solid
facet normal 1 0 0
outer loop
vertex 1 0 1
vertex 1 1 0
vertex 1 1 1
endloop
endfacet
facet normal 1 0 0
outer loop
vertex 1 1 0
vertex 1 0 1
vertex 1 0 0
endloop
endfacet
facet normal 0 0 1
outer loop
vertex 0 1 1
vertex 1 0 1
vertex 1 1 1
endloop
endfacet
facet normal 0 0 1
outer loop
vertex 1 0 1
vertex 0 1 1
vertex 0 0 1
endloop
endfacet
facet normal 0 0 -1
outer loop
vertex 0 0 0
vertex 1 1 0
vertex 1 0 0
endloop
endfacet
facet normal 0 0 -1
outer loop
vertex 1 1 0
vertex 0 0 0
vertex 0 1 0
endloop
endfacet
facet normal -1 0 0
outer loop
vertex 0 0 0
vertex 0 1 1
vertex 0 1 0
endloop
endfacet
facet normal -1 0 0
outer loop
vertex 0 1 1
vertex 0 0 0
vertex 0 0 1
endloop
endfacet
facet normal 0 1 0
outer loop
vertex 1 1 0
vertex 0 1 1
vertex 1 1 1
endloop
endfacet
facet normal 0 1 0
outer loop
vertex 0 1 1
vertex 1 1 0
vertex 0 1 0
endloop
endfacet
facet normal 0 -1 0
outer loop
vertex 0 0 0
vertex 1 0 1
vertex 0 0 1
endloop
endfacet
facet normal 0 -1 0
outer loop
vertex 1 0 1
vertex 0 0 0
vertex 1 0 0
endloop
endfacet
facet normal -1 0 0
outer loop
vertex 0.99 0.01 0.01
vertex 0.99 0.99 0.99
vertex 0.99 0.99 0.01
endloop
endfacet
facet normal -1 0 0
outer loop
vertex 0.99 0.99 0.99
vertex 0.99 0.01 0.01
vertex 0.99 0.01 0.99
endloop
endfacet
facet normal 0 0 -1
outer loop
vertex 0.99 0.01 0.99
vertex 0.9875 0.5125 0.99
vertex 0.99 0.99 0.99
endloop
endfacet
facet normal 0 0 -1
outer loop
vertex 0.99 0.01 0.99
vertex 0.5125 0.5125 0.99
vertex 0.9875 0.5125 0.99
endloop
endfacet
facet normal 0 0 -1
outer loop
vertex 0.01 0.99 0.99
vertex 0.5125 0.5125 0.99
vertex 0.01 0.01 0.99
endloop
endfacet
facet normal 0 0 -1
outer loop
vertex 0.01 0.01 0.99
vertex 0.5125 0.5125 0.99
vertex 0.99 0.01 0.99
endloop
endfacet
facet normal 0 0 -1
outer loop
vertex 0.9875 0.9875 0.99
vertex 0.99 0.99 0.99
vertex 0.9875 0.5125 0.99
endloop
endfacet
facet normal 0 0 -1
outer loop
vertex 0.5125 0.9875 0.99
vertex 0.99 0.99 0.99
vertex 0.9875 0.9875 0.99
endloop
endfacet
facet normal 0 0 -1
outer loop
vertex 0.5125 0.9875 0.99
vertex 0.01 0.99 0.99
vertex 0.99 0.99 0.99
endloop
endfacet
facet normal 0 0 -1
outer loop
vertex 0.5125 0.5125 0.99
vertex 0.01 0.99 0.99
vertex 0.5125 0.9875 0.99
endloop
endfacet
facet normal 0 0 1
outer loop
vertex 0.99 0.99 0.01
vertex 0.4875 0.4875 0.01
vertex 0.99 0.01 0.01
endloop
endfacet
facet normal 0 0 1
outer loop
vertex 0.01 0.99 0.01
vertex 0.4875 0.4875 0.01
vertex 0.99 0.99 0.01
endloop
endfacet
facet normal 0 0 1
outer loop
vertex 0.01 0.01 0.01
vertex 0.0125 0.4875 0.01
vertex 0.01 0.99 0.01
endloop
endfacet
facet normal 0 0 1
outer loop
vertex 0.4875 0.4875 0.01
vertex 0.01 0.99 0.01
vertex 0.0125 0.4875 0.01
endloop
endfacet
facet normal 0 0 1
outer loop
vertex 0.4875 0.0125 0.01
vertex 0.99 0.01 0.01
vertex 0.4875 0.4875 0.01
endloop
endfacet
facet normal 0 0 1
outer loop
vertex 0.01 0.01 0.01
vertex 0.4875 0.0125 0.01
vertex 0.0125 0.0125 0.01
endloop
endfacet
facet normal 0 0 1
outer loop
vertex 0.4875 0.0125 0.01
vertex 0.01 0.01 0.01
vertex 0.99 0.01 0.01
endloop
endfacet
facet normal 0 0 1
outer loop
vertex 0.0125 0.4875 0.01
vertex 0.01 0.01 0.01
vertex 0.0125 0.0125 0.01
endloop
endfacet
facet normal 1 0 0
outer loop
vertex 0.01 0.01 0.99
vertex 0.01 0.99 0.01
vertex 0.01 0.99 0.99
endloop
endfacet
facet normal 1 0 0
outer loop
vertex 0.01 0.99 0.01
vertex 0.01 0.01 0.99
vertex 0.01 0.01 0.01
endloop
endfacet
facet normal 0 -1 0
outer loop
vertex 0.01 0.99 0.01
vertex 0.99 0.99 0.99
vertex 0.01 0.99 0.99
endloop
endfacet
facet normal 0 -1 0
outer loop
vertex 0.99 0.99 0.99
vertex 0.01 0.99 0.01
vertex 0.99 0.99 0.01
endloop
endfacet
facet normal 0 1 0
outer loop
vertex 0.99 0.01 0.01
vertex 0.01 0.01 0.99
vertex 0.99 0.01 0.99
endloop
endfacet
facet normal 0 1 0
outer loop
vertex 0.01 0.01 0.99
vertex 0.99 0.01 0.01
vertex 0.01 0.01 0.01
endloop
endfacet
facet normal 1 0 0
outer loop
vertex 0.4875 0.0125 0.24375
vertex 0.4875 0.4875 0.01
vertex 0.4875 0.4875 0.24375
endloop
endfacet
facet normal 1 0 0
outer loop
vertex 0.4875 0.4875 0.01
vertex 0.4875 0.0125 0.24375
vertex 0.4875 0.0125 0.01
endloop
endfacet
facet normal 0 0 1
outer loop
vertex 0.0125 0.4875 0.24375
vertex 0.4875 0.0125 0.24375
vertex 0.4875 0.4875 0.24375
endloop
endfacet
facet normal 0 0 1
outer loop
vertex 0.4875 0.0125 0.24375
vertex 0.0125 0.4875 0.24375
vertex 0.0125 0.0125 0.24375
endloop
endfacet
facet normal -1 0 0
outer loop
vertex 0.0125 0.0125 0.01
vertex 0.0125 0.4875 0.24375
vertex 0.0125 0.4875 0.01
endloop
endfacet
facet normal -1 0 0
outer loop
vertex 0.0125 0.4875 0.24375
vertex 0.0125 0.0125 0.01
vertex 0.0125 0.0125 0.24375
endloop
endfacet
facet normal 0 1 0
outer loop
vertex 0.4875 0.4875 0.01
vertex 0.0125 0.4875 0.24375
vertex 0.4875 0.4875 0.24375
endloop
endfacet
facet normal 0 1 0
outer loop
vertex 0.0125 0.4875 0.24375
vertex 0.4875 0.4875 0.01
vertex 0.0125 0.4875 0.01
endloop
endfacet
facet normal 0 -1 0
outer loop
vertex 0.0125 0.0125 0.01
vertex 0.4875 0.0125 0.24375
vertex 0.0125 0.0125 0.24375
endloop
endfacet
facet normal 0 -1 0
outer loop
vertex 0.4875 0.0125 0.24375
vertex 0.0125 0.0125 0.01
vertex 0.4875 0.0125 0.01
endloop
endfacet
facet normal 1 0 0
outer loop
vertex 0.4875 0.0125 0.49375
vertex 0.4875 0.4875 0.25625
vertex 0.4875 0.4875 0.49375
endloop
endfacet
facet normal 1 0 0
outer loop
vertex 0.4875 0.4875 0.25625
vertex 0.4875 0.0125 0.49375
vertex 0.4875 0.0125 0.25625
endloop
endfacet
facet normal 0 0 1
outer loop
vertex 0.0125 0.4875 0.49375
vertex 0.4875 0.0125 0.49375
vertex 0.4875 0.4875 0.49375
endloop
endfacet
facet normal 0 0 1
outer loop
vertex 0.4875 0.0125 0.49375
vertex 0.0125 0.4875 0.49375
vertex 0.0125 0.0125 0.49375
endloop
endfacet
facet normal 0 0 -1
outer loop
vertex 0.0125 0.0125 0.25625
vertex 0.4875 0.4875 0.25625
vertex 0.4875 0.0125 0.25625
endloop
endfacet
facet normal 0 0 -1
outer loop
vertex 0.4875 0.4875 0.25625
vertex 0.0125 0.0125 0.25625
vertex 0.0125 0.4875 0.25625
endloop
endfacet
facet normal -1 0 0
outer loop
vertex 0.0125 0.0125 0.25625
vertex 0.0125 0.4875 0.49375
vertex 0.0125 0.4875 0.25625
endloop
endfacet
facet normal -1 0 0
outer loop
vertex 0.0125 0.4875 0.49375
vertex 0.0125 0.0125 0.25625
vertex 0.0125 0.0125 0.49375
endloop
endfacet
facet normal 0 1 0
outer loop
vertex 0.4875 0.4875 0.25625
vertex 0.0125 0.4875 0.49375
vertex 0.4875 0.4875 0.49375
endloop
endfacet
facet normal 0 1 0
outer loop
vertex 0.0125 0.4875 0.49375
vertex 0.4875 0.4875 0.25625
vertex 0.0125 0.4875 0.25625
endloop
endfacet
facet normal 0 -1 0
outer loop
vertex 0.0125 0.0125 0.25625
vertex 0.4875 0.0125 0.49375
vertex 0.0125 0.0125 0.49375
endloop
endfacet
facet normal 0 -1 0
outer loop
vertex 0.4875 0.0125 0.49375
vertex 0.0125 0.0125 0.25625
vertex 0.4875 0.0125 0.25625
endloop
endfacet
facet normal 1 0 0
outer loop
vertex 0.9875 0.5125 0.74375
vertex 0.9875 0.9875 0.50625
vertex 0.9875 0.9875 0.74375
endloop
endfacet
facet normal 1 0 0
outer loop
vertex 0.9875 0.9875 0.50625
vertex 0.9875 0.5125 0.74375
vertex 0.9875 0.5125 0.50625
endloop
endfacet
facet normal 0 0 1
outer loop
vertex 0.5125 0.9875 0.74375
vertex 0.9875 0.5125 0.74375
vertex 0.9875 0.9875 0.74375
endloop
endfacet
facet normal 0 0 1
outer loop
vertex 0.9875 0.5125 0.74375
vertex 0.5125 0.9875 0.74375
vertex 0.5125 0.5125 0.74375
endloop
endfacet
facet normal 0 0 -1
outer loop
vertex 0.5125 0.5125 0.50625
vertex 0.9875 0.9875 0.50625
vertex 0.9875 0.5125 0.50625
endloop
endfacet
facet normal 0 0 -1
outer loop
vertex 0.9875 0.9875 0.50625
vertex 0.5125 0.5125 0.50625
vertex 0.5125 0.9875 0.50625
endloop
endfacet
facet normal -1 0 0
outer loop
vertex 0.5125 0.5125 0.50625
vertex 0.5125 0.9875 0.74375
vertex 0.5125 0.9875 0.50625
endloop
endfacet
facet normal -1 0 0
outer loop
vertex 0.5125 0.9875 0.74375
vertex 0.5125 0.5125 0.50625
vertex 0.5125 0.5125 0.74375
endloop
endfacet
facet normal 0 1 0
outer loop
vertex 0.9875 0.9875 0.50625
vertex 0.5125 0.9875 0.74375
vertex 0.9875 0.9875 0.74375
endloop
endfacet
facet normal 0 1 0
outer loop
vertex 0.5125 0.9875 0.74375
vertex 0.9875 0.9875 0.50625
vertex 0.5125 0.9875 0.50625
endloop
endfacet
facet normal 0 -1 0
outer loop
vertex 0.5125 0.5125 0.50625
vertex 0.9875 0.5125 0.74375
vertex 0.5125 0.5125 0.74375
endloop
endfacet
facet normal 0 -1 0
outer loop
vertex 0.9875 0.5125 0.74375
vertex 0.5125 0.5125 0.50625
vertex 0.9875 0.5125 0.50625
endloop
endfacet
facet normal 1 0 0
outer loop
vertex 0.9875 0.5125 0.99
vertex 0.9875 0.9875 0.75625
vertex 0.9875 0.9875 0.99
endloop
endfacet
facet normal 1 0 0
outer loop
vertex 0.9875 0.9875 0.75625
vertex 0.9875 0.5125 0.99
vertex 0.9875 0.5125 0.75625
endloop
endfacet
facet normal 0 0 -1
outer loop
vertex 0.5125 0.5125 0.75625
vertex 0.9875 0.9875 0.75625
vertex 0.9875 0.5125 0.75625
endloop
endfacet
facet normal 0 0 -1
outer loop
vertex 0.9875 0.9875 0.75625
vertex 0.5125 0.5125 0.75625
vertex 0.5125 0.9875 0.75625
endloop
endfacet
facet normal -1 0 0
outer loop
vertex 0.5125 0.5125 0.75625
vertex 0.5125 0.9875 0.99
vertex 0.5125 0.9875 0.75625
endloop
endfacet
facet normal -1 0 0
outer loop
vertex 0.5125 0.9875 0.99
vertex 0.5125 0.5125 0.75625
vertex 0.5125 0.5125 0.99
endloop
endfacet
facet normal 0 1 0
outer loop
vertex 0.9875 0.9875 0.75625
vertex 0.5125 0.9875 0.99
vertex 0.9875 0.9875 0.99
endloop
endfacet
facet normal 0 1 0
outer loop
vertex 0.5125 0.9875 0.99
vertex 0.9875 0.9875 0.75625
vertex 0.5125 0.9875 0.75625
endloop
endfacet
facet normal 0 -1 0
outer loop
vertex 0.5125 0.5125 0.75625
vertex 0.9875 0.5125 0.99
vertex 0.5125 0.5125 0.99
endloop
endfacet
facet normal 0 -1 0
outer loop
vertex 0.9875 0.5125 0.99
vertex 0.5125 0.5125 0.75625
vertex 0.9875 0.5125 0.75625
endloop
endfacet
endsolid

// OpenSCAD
translate([0.25, 0.25, 0.125]) color([0.5724302025923821, 0.22728732004270547, 0.8377719495956792]) cube([0.475, 0.475, 0.2375], center=true);
translate([0.25, 0.25, 0.375]) color([0.3661955888727618, 0.7135191579002272, 0.515047468161266]) cube([0.475, 0.475, 0.2375], center=true);
translate([0.75, 0.75, 0.625]) color([0.13764795316468892, 0.40448573996937276, 0.8917260836787828]) cube([0.475, 0.475, 0.2375], center=true);
translate([0.75, 0.75, 0.875]) color([0.7643233656004556, 0.5236824296690593, 0.15029798138806982]) cube([0.475, 0.475, 0.2375], center=true);
color([0.3,0.3,0.3,0.3]) difference() { cube([1,1,1]); translate([0.01,0.01,0.01]) cube([0.98,0.98,0.98]); }
